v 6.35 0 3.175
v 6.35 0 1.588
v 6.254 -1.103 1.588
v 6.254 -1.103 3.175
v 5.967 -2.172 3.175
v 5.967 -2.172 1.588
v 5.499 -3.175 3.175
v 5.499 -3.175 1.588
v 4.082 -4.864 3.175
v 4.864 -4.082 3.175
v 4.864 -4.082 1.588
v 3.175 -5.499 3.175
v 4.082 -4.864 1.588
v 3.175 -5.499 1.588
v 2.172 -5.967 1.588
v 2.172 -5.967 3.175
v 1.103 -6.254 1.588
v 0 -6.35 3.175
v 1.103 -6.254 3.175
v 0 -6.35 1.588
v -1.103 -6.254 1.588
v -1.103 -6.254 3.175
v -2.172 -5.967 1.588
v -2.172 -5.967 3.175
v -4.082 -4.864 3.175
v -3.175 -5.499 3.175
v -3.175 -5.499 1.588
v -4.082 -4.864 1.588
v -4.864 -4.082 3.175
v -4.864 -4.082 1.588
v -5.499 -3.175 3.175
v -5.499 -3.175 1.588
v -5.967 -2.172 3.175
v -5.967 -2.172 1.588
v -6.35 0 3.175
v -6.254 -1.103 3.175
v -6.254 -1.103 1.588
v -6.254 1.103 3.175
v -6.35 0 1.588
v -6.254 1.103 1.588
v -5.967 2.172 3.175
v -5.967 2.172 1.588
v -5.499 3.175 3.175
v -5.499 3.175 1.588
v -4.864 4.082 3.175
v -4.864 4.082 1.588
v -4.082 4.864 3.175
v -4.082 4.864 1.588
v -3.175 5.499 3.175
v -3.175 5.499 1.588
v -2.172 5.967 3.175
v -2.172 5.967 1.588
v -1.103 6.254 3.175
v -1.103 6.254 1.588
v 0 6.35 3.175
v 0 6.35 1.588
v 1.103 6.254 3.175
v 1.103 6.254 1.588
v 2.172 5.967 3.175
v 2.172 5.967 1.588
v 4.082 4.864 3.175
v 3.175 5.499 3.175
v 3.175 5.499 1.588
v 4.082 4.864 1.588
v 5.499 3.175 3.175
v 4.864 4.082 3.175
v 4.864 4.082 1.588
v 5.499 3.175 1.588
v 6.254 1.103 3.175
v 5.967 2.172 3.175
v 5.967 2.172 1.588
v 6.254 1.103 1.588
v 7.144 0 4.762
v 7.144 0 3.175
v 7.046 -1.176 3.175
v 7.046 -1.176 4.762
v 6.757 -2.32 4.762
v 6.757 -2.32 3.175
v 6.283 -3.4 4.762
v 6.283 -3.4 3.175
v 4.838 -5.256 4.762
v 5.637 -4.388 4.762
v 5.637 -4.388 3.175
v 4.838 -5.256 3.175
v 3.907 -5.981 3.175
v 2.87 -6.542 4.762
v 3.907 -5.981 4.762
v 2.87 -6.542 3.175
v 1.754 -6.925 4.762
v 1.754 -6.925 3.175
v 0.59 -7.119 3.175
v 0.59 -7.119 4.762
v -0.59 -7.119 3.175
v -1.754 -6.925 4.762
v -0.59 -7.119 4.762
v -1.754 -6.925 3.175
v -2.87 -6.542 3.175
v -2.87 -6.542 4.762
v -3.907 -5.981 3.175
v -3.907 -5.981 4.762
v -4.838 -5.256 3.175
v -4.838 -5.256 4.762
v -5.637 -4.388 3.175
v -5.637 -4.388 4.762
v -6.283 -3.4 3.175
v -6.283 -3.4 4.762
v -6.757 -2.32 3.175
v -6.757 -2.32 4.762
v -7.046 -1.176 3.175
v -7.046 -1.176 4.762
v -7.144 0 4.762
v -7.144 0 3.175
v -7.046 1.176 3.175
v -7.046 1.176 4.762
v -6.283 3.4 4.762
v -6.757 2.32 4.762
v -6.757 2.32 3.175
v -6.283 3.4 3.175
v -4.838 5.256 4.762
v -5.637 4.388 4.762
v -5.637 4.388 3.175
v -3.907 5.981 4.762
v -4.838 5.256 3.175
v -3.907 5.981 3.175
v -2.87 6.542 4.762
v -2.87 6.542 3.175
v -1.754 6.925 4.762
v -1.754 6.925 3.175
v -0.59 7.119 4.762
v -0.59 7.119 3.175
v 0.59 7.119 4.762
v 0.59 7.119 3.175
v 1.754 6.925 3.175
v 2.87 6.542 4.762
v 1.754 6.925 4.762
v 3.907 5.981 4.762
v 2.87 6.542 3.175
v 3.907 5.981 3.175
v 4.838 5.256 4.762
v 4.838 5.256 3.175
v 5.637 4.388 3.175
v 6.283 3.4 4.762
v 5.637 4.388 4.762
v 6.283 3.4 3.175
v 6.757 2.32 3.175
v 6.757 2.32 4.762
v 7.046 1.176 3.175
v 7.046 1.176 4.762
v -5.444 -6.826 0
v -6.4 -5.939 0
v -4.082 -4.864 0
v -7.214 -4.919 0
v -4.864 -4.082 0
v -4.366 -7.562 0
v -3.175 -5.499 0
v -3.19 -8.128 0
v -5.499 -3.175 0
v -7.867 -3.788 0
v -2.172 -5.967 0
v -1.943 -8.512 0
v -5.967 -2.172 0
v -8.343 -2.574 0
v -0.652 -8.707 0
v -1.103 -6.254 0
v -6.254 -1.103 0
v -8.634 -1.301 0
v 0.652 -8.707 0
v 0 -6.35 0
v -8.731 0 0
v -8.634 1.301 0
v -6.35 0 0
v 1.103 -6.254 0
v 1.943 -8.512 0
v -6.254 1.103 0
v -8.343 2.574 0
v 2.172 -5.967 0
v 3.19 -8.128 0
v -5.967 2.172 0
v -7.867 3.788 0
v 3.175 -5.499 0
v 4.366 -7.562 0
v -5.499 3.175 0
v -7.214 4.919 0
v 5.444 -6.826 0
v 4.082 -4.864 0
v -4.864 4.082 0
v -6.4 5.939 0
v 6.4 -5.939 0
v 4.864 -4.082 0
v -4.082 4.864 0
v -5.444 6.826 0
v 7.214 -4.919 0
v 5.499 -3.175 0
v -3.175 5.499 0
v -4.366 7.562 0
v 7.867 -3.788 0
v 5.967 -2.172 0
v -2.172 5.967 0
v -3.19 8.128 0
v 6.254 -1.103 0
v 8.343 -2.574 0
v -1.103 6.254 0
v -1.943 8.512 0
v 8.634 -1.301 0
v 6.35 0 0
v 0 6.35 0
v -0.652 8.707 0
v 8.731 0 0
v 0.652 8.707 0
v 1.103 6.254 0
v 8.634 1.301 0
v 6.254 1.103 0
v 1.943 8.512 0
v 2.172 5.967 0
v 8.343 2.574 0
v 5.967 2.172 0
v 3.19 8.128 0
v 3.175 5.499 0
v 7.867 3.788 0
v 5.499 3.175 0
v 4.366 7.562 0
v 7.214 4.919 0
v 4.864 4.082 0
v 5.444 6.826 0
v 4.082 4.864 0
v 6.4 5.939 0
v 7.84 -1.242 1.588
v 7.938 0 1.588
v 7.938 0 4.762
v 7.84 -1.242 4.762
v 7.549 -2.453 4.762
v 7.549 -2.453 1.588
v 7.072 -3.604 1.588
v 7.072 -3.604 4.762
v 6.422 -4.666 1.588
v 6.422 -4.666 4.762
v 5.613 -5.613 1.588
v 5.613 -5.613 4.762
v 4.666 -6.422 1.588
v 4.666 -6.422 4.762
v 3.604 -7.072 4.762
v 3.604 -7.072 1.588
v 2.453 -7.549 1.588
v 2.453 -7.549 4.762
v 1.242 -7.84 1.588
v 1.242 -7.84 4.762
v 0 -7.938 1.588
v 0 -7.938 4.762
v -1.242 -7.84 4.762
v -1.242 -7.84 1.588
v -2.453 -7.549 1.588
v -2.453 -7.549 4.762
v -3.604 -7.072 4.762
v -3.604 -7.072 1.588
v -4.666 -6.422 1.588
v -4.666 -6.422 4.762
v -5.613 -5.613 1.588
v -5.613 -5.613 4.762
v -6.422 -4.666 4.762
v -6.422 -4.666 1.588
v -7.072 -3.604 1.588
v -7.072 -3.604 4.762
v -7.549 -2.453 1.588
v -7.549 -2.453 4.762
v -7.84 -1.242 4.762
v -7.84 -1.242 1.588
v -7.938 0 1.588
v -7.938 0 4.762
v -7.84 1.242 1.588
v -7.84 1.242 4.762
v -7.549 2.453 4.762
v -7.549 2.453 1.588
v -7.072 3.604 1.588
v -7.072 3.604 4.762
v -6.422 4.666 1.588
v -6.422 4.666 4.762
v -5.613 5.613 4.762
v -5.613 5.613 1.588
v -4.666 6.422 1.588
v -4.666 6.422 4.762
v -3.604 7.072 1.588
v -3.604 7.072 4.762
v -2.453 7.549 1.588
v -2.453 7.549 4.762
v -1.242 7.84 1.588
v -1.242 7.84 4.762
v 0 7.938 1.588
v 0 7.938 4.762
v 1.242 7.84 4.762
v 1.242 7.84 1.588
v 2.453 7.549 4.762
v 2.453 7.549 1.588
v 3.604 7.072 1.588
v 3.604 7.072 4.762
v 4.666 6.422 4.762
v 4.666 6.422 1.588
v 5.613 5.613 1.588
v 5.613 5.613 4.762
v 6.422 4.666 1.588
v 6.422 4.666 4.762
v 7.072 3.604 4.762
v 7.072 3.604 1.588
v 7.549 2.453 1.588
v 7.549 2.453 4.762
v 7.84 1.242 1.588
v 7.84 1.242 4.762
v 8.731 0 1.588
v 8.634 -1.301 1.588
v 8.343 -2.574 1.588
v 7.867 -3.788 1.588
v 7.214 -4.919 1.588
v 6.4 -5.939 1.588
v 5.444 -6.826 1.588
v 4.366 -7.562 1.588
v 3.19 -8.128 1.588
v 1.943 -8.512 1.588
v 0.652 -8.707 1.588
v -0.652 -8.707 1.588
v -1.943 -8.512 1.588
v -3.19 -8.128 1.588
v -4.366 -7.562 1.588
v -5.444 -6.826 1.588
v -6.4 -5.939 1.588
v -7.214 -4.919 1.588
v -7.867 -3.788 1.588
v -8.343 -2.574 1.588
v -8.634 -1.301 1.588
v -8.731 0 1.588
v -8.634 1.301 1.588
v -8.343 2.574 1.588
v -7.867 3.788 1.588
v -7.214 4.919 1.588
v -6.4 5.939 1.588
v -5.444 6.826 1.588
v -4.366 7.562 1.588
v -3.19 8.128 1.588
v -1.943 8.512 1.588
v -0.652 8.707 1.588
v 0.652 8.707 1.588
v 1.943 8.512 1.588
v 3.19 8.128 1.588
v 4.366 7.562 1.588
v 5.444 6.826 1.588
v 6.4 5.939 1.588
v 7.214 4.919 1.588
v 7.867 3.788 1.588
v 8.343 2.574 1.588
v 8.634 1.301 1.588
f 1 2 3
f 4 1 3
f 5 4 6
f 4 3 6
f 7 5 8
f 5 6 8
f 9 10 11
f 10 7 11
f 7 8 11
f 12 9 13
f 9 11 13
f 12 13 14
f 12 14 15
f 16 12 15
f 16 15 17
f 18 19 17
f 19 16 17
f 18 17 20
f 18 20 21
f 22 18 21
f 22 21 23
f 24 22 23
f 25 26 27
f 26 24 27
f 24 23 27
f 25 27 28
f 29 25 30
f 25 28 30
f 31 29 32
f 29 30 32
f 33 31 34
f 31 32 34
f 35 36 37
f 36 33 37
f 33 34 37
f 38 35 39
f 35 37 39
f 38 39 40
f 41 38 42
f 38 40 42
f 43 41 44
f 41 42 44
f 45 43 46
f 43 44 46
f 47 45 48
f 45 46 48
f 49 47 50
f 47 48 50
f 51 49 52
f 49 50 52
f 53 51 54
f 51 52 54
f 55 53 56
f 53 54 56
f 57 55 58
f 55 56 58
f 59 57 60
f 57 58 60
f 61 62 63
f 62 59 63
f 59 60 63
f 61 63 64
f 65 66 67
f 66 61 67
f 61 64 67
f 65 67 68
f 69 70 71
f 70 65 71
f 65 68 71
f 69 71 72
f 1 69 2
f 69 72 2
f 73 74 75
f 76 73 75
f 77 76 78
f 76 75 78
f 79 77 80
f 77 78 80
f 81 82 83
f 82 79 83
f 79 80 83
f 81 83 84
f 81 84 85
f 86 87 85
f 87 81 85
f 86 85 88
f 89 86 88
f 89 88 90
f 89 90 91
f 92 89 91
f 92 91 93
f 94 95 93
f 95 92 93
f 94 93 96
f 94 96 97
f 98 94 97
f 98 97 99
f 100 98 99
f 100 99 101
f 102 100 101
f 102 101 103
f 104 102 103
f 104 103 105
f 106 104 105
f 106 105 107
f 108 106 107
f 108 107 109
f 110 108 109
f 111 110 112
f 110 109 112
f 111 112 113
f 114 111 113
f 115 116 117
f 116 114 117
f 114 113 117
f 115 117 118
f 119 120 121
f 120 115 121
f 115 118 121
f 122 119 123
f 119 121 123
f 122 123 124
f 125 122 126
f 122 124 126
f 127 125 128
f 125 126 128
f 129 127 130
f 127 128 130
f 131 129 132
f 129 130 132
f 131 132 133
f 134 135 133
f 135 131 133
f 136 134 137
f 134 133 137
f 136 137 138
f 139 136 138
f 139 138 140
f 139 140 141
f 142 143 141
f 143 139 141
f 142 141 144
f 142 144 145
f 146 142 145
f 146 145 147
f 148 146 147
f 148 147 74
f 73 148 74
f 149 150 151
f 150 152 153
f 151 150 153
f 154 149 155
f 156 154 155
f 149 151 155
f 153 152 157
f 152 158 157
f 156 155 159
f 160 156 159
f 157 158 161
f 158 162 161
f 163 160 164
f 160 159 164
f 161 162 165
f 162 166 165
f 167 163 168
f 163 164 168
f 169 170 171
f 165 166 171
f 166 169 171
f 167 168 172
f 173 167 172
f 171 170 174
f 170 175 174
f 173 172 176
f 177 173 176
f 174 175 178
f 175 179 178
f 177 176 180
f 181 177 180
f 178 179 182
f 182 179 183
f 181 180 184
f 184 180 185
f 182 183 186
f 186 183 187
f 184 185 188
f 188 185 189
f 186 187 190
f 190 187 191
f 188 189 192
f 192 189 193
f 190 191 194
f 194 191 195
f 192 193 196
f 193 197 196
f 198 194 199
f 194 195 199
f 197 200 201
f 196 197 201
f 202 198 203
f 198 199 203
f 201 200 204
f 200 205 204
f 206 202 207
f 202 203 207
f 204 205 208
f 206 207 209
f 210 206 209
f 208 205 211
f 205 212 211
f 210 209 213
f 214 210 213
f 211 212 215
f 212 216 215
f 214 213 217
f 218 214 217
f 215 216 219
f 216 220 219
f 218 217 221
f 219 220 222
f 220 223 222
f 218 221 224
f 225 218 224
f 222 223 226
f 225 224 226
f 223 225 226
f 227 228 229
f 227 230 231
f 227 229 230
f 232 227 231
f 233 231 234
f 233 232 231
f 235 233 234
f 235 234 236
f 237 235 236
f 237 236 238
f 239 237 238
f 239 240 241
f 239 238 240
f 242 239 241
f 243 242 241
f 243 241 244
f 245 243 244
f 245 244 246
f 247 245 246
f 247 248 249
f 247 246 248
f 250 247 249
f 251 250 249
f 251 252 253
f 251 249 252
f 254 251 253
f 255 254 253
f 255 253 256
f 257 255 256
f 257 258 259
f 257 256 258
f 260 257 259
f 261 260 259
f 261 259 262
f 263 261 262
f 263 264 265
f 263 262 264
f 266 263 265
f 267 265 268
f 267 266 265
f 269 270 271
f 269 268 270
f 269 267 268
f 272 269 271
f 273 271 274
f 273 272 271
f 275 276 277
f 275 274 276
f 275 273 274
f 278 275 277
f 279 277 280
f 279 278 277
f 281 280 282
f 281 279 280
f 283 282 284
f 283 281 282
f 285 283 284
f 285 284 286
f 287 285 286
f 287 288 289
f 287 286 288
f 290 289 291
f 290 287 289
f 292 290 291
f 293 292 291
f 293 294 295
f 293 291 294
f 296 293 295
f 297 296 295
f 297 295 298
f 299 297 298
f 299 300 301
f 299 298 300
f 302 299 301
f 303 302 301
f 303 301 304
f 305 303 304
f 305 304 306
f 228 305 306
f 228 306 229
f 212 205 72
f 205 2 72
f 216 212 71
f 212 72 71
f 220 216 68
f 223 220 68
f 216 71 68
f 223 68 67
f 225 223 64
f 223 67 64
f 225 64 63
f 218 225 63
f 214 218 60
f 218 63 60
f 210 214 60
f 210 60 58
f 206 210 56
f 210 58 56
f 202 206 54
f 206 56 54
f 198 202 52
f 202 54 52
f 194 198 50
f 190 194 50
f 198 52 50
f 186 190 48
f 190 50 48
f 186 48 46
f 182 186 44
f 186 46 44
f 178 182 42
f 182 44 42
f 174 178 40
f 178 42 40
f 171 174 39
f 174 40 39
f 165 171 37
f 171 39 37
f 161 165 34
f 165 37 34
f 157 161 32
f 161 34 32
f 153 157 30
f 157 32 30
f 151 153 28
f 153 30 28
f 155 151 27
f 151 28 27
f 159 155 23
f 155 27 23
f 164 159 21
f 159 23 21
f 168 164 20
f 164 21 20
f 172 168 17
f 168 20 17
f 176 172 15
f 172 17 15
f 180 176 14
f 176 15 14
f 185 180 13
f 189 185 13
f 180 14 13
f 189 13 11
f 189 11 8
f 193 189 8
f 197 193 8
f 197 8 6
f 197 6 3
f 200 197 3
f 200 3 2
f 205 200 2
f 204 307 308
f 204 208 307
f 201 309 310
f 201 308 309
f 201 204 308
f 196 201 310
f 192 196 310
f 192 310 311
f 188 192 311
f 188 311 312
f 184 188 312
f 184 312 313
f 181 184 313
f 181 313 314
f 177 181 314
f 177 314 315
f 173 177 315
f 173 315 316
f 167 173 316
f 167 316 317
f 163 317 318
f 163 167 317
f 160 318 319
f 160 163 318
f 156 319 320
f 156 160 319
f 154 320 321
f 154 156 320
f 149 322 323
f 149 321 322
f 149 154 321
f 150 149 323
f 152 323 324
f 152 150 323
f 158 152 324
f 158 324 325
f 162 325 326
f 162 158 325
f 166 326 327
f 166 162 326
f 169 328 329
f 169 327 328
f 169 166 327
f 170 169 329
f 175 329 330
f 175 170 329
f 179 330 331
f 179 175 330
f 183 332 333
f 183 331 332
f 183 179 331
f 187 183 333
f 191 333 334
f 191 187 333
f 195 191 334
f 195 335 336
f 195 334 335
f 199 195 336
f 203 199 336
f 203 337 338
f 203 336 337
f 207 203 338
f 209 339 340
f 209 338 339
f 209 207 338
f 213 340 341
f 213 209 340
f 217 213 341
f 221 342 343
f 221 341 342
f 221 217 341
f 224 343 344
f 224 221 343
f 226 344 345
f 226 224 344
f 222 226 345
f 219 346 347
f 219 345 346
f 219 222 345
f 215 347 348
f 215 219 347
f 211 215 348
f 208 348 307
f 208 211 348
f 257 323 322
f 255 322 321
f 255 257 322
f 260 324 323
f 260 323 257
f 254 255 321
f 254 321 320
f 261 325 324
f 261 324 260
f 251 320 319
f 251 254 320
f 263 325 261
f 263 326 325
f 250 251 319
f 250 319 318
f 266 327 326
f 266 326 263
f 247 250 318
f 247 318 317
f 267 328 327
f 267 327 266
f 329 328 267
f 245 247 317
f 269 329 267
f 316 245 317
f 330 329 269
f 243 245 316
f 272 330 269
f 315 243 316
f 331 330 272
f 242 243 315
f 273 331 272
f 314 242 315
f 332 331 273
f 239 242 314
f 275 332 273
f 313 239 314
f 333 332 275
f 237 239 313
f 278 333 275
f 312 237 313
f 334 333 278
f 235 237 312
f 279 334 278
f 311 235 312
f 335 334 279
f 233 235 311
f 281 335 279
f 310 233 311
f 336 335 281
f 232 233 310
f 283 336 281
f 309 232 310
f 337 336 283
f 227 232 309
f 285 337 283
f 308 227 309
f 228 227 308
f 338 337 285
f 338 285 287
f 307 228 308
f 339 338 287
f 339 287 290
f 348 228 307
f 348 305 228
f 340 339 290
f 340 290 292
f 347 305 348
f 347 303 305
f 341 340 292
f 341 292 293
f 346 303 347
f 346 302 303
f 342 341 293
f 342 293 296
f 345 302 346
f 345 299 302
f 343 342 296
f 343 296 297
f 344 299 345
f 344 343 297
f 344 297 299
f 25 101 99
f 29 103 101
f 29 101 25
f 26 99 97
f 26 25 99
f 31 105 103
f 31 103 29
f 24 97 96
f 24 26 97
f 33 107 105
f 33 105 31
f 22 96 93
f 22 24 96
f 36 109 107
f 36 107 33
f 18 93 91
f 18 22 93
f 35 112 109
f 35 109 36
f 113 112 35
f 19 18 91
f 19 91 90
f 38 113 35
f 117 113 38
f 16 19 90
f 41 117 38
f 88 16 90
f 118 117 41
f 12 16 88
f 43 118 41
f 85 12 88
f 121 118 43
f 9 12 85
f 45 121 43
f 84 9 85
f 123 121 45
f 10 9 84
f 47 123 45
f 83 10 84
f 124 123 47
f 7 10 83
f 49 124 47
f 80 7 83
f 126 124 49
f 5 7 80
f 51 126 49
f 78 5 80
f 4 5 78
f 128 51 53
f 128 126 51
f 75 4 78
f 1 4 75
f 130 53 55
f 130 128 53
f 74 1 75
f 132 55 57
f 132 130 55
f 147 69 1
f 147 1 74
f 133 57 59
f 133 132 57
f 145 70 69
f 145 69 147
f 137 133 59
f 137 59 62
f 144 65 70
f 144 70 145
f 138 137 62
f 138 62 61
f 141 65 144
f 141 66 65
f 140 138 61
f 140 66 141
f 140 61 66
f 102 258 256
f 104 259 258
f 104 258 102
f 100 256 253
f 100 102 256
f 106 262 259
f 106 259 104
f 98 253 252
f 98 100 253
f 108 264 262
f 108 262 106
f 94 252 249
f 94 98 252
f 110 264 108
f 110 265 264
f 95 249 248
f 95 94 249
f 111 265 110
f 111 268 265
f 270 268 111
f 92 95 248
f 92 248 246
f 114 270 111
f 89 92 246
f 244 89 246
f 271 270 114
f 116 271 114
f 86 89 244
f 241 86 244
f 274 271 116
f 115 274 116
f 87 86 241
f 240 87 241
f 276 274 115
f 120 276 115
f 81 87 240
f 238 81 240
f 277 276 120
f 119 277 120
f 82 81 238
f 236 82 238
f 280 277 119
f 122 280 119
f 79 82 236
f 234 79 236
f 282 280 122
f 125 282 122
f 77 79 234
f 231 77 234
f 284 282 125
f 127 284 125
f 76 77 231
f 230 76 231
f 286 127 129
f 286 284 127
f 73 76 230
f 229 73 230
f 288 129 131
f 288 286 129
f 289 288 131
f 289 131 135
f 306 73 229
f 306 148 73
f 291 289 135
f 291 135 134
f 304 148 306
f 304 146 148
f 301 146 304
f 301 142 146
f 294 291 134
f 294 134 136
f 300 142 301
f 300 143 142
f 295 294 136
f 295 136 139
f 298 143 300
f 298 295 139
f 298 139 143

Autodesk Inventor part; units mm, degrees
ref_plane "YZ Plane" through (0, 0, 0) normal (1, 0, 0) x (0, 1, 0)
ref_plane "XZ Plane" through (0, 0, 0) normal (0, 1, 0) x (-1, 0, 0)
ref_plane "XY Plane" through (0, 0, 0) normal (0, 0, 1) x (1, 0, 0)
sketch "Sketch1" plane through (0, 0, 0) normal (0, 0, 1) x (1, 0, 0)
  circle A0 centre (0, 0) radius 6.35
  circle A1 centre (0, 0) radius 8.7313
  circle A2 centre (0, 0) radius 7.9375
  dimension "d0" = 12.7
  dimension "d3" = 17.4625
  dimension "d4" = 0.7937
extrude "Extrusion1" add sketch "Sketch1" along normal blind 1.5875 contours A0 | A1 | A2
sketch "Sketch2" plane through (0, 0, 1.5875) normal (0, 0, 1) x (1, 0, 0)
  circle A0 centre (0, 0) radius 6.35
  circle A1 centre (0, 0) radius 8.7313
  circle A2 centre (0, 0) radius 7.9375
  dimension "d7" = 12.7
  dimension "d8" = 17.4625
  dimension "d9" = 0.7937
extrude "Extrusion2" add sketch "Sketch2" along normal blind 1.5875 contours A2
sketch "Sketch3" plane through (0, 0, 1.5875) normal (0, 0, 1) x (1, 0, 0)
  circle A0 centre (0, 0) radius 6.35 projected
  circle A1 centre (0, 0) radius 6.35
extrude "Extrusion3" cut sketch "Sketch3" against normal blind 3.175
sketch "Sketch4" plane through (0, 0, 3.175) normal (0, 0, 1) x (1, 0, 0)
  circle A0 centre (0, 0) radius 7.9375 projected
  circle A1 centre (0, 0) radius 7.9375
  circle A2 centre (0, 0) radius 7.1438
  dimension "d14" = 0.7937
extrude "Extrusion4" add sketch "Sketch4" along normal blind 1.5875
properties part number "Needle Bearing Stopper"
